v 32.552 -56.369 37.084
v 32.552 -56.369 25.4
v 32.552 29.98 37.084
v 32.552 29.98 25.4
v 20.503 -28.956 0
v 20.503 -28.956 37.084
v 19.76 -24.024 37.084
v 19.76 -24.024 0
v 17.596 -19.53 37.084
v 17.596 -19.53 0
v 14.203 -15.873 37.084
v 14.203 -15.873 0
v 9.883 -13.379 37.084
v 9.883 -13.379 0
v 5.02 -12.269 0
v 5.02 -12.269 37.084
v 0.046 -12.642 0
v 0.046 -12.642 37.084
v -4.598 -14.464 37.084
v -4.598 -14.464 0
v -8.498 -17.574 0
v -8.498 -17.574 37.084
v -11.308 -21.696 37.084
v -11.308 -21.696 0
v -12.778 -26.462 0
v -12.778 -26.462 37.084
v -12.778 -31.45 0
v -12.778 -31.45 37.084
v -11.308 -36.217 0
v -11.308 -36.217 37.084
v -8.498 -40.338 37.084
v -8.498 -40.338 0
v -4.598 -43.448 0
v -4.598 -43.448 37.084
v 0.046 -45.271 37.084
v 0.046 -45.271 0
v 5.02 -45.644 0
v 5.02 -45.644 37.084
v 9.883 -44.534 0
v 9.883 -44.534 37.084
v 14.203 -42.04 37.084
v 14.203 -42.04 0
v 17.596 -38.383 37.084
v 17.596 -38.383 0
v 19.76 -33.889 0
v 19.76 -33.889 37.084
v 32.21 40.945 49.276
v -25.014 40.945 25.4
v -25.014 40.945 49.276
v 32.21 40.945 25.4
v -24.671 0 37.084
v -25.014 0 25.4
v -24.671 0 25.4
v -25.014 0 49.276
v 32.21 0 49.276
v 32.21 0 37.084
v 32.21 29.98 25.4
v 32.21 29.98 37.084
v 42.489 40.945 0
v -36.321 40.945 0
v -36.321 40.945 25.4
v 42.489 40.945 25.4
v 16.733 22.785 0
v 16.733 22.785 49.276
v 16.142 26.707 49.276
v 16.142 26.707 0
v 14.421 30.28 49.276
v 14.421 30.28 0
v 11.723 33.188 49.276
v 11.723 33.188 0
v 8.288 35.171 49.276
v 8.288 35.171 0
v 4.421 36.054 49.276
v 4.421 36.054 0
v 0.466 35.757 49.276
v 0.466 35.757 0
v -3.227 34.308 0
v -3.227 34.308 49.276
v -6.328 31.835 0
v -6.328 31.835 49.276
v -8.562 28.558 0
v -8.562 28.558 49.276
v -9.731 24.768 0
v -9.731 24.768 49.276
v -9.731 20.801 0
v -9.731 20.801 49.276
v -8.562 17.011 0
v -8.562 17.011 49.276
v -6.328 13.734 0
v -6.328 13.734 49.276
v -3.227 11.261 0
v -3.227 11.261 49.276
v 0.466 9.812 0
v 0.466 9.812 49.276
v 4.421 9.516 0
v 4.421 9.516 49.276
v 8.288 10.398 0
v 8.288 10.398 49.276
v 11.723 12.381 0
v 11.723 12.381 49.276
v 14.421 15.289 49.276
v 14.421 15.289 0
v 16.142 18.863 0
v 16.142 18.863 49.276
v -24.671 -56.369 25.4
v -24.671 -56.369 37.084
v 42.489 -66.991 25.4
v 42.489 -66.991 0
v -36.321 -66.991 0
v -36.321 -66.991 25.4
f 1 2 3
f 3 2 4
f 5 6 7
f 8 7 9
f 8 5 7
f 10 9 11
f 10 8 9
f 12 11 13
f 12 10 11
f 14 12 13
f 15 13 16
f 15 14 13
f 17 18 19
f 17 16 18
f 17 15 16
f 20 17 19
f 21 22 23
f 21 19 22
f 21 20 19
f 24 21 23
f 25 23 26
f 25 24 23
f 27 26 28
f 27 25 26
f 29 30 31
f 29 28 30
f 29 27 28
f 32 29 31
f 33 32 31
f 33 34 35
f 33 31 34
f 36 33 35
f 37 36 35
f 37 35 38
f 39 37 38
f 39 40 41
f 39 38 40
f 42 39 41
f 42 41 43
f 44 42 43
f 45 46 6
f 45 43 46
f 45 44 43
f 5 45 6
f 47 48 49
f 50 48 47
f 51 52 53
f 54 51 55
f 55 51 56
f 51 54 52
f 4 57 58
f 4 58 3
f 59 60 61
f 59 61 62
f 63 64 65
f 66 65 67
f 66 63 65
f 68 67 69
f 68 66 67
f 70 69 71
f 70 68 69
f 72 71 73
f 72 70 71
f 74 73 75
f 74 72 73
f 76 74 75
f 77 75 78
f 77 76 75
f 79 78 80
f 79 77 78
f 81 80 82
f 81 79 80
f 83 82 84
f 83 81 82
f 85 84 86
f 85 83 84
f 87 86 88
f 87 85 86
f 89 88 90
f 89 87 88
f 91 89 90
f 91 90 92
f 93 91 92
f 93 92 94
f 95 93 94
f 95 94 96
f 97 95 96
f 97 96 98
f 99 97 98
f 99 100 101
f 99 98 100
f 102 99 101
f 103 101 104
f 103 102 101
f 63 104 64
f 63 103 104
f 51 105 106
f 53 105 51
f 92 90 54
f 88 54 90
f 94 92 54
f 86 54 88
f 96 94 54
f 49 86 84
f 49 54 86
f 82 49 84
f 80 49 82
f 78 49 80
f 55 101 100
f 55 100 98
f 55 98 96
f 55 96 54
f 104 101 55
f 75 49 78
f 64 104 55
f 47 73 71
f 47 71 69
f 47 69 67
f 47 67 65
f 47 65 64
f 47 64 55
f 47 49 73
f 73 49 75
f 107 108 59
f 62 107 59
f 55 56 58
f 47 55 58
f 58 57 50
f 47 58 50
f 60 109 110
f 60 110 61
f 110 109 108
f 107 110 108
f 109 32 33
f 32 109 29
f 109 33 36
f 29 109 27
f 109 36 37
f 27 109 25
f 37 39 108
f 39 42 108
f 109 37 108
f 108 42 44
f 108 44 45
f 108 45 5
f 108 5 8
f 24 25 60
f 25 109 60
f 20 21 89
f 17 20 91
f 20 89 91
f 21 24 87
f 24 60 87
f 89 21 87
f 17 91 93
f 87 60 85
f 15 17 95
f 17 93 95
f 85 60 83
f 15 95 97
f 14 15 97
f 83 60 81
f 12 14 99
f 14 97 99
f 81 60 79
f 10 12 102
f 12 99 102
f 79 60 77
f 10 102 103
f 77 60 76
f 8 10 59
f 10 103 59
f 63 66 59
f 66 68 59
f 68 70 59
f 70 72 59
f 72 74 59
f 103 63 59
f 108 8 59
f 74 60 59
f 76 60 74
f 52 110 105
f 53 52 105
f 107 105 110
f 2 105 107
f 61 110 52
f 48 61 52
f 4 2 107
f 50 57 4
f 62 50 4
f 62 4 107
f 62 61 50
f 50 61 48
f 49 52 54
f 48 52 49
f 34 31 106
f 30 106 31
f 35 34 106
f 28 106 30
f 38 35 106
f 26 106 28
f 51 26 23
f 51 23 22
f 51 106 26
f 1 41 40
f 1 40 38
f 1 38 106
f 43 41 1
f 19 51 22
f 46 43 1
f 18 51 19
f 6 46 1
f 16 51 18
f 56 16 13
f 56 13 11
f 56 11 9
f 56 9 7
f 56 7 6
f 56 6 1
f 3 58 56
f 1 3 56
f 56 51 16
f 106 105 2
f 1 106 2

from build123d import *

# Parameters (mm, degrees)
F0_W     = 78.810706
F0_H     = 107.936401
F1_DEPTH = 25.4
F2_W     = 57.223428
F2_H     = 86.349123
F3_DEPTH = 37.084
F4_W     = 57.223426
F4_H     = 40.945355
F5_DEPTH = 49.276
F6_R     = 13.306324
F8_DEPTH = 92.456
F7_R     = 16.734073
F9_DEPTH = 76.962


with BuildPart() as f1:
    # F0 (on Top) → F1 (new body)
    with BuildSketch(Plane.XY):
        with Locations((3.083896, -13.022845)):
            Rectangle(F0_W, F0_H)
    extrude(amount=F1_DEPTH)

    # F2 (on Top) → F3 (join)
    with BuildSketch(Plane.XY):
        with Locations((3.940536, -13.194174)):
            Rectangle(F2_W, F2_H)
    extrude(amount=F3_DEPTH)

    # F4 (on Top) → F5 (join)
    with BuildSketch(Plane.XY):
        with Locations((3.597881, 20.472677)):
            Rectangle(F4_W, F4_H)
    extrude(amount=F5_DEPTH)

    # F6 (on Top) → F8 (cut)
    with BuildSketch(Plane.XY):
        with Locations((3.426551, 22.784626)):
            Circle(F6_R)
    extrude(amount=F8_DEPTH, mode=Mode.SUBTRACT)

    # F7 (on Top) → F9 (cut)
    with BuildSketch(Plane.XY):
        with Locations((3.769206, -28.956316)):
            Circle(F7_R)
    extrude(amount=F9_DEPTH, mode=Mode.SUBTRACT)


solid = f1.part
